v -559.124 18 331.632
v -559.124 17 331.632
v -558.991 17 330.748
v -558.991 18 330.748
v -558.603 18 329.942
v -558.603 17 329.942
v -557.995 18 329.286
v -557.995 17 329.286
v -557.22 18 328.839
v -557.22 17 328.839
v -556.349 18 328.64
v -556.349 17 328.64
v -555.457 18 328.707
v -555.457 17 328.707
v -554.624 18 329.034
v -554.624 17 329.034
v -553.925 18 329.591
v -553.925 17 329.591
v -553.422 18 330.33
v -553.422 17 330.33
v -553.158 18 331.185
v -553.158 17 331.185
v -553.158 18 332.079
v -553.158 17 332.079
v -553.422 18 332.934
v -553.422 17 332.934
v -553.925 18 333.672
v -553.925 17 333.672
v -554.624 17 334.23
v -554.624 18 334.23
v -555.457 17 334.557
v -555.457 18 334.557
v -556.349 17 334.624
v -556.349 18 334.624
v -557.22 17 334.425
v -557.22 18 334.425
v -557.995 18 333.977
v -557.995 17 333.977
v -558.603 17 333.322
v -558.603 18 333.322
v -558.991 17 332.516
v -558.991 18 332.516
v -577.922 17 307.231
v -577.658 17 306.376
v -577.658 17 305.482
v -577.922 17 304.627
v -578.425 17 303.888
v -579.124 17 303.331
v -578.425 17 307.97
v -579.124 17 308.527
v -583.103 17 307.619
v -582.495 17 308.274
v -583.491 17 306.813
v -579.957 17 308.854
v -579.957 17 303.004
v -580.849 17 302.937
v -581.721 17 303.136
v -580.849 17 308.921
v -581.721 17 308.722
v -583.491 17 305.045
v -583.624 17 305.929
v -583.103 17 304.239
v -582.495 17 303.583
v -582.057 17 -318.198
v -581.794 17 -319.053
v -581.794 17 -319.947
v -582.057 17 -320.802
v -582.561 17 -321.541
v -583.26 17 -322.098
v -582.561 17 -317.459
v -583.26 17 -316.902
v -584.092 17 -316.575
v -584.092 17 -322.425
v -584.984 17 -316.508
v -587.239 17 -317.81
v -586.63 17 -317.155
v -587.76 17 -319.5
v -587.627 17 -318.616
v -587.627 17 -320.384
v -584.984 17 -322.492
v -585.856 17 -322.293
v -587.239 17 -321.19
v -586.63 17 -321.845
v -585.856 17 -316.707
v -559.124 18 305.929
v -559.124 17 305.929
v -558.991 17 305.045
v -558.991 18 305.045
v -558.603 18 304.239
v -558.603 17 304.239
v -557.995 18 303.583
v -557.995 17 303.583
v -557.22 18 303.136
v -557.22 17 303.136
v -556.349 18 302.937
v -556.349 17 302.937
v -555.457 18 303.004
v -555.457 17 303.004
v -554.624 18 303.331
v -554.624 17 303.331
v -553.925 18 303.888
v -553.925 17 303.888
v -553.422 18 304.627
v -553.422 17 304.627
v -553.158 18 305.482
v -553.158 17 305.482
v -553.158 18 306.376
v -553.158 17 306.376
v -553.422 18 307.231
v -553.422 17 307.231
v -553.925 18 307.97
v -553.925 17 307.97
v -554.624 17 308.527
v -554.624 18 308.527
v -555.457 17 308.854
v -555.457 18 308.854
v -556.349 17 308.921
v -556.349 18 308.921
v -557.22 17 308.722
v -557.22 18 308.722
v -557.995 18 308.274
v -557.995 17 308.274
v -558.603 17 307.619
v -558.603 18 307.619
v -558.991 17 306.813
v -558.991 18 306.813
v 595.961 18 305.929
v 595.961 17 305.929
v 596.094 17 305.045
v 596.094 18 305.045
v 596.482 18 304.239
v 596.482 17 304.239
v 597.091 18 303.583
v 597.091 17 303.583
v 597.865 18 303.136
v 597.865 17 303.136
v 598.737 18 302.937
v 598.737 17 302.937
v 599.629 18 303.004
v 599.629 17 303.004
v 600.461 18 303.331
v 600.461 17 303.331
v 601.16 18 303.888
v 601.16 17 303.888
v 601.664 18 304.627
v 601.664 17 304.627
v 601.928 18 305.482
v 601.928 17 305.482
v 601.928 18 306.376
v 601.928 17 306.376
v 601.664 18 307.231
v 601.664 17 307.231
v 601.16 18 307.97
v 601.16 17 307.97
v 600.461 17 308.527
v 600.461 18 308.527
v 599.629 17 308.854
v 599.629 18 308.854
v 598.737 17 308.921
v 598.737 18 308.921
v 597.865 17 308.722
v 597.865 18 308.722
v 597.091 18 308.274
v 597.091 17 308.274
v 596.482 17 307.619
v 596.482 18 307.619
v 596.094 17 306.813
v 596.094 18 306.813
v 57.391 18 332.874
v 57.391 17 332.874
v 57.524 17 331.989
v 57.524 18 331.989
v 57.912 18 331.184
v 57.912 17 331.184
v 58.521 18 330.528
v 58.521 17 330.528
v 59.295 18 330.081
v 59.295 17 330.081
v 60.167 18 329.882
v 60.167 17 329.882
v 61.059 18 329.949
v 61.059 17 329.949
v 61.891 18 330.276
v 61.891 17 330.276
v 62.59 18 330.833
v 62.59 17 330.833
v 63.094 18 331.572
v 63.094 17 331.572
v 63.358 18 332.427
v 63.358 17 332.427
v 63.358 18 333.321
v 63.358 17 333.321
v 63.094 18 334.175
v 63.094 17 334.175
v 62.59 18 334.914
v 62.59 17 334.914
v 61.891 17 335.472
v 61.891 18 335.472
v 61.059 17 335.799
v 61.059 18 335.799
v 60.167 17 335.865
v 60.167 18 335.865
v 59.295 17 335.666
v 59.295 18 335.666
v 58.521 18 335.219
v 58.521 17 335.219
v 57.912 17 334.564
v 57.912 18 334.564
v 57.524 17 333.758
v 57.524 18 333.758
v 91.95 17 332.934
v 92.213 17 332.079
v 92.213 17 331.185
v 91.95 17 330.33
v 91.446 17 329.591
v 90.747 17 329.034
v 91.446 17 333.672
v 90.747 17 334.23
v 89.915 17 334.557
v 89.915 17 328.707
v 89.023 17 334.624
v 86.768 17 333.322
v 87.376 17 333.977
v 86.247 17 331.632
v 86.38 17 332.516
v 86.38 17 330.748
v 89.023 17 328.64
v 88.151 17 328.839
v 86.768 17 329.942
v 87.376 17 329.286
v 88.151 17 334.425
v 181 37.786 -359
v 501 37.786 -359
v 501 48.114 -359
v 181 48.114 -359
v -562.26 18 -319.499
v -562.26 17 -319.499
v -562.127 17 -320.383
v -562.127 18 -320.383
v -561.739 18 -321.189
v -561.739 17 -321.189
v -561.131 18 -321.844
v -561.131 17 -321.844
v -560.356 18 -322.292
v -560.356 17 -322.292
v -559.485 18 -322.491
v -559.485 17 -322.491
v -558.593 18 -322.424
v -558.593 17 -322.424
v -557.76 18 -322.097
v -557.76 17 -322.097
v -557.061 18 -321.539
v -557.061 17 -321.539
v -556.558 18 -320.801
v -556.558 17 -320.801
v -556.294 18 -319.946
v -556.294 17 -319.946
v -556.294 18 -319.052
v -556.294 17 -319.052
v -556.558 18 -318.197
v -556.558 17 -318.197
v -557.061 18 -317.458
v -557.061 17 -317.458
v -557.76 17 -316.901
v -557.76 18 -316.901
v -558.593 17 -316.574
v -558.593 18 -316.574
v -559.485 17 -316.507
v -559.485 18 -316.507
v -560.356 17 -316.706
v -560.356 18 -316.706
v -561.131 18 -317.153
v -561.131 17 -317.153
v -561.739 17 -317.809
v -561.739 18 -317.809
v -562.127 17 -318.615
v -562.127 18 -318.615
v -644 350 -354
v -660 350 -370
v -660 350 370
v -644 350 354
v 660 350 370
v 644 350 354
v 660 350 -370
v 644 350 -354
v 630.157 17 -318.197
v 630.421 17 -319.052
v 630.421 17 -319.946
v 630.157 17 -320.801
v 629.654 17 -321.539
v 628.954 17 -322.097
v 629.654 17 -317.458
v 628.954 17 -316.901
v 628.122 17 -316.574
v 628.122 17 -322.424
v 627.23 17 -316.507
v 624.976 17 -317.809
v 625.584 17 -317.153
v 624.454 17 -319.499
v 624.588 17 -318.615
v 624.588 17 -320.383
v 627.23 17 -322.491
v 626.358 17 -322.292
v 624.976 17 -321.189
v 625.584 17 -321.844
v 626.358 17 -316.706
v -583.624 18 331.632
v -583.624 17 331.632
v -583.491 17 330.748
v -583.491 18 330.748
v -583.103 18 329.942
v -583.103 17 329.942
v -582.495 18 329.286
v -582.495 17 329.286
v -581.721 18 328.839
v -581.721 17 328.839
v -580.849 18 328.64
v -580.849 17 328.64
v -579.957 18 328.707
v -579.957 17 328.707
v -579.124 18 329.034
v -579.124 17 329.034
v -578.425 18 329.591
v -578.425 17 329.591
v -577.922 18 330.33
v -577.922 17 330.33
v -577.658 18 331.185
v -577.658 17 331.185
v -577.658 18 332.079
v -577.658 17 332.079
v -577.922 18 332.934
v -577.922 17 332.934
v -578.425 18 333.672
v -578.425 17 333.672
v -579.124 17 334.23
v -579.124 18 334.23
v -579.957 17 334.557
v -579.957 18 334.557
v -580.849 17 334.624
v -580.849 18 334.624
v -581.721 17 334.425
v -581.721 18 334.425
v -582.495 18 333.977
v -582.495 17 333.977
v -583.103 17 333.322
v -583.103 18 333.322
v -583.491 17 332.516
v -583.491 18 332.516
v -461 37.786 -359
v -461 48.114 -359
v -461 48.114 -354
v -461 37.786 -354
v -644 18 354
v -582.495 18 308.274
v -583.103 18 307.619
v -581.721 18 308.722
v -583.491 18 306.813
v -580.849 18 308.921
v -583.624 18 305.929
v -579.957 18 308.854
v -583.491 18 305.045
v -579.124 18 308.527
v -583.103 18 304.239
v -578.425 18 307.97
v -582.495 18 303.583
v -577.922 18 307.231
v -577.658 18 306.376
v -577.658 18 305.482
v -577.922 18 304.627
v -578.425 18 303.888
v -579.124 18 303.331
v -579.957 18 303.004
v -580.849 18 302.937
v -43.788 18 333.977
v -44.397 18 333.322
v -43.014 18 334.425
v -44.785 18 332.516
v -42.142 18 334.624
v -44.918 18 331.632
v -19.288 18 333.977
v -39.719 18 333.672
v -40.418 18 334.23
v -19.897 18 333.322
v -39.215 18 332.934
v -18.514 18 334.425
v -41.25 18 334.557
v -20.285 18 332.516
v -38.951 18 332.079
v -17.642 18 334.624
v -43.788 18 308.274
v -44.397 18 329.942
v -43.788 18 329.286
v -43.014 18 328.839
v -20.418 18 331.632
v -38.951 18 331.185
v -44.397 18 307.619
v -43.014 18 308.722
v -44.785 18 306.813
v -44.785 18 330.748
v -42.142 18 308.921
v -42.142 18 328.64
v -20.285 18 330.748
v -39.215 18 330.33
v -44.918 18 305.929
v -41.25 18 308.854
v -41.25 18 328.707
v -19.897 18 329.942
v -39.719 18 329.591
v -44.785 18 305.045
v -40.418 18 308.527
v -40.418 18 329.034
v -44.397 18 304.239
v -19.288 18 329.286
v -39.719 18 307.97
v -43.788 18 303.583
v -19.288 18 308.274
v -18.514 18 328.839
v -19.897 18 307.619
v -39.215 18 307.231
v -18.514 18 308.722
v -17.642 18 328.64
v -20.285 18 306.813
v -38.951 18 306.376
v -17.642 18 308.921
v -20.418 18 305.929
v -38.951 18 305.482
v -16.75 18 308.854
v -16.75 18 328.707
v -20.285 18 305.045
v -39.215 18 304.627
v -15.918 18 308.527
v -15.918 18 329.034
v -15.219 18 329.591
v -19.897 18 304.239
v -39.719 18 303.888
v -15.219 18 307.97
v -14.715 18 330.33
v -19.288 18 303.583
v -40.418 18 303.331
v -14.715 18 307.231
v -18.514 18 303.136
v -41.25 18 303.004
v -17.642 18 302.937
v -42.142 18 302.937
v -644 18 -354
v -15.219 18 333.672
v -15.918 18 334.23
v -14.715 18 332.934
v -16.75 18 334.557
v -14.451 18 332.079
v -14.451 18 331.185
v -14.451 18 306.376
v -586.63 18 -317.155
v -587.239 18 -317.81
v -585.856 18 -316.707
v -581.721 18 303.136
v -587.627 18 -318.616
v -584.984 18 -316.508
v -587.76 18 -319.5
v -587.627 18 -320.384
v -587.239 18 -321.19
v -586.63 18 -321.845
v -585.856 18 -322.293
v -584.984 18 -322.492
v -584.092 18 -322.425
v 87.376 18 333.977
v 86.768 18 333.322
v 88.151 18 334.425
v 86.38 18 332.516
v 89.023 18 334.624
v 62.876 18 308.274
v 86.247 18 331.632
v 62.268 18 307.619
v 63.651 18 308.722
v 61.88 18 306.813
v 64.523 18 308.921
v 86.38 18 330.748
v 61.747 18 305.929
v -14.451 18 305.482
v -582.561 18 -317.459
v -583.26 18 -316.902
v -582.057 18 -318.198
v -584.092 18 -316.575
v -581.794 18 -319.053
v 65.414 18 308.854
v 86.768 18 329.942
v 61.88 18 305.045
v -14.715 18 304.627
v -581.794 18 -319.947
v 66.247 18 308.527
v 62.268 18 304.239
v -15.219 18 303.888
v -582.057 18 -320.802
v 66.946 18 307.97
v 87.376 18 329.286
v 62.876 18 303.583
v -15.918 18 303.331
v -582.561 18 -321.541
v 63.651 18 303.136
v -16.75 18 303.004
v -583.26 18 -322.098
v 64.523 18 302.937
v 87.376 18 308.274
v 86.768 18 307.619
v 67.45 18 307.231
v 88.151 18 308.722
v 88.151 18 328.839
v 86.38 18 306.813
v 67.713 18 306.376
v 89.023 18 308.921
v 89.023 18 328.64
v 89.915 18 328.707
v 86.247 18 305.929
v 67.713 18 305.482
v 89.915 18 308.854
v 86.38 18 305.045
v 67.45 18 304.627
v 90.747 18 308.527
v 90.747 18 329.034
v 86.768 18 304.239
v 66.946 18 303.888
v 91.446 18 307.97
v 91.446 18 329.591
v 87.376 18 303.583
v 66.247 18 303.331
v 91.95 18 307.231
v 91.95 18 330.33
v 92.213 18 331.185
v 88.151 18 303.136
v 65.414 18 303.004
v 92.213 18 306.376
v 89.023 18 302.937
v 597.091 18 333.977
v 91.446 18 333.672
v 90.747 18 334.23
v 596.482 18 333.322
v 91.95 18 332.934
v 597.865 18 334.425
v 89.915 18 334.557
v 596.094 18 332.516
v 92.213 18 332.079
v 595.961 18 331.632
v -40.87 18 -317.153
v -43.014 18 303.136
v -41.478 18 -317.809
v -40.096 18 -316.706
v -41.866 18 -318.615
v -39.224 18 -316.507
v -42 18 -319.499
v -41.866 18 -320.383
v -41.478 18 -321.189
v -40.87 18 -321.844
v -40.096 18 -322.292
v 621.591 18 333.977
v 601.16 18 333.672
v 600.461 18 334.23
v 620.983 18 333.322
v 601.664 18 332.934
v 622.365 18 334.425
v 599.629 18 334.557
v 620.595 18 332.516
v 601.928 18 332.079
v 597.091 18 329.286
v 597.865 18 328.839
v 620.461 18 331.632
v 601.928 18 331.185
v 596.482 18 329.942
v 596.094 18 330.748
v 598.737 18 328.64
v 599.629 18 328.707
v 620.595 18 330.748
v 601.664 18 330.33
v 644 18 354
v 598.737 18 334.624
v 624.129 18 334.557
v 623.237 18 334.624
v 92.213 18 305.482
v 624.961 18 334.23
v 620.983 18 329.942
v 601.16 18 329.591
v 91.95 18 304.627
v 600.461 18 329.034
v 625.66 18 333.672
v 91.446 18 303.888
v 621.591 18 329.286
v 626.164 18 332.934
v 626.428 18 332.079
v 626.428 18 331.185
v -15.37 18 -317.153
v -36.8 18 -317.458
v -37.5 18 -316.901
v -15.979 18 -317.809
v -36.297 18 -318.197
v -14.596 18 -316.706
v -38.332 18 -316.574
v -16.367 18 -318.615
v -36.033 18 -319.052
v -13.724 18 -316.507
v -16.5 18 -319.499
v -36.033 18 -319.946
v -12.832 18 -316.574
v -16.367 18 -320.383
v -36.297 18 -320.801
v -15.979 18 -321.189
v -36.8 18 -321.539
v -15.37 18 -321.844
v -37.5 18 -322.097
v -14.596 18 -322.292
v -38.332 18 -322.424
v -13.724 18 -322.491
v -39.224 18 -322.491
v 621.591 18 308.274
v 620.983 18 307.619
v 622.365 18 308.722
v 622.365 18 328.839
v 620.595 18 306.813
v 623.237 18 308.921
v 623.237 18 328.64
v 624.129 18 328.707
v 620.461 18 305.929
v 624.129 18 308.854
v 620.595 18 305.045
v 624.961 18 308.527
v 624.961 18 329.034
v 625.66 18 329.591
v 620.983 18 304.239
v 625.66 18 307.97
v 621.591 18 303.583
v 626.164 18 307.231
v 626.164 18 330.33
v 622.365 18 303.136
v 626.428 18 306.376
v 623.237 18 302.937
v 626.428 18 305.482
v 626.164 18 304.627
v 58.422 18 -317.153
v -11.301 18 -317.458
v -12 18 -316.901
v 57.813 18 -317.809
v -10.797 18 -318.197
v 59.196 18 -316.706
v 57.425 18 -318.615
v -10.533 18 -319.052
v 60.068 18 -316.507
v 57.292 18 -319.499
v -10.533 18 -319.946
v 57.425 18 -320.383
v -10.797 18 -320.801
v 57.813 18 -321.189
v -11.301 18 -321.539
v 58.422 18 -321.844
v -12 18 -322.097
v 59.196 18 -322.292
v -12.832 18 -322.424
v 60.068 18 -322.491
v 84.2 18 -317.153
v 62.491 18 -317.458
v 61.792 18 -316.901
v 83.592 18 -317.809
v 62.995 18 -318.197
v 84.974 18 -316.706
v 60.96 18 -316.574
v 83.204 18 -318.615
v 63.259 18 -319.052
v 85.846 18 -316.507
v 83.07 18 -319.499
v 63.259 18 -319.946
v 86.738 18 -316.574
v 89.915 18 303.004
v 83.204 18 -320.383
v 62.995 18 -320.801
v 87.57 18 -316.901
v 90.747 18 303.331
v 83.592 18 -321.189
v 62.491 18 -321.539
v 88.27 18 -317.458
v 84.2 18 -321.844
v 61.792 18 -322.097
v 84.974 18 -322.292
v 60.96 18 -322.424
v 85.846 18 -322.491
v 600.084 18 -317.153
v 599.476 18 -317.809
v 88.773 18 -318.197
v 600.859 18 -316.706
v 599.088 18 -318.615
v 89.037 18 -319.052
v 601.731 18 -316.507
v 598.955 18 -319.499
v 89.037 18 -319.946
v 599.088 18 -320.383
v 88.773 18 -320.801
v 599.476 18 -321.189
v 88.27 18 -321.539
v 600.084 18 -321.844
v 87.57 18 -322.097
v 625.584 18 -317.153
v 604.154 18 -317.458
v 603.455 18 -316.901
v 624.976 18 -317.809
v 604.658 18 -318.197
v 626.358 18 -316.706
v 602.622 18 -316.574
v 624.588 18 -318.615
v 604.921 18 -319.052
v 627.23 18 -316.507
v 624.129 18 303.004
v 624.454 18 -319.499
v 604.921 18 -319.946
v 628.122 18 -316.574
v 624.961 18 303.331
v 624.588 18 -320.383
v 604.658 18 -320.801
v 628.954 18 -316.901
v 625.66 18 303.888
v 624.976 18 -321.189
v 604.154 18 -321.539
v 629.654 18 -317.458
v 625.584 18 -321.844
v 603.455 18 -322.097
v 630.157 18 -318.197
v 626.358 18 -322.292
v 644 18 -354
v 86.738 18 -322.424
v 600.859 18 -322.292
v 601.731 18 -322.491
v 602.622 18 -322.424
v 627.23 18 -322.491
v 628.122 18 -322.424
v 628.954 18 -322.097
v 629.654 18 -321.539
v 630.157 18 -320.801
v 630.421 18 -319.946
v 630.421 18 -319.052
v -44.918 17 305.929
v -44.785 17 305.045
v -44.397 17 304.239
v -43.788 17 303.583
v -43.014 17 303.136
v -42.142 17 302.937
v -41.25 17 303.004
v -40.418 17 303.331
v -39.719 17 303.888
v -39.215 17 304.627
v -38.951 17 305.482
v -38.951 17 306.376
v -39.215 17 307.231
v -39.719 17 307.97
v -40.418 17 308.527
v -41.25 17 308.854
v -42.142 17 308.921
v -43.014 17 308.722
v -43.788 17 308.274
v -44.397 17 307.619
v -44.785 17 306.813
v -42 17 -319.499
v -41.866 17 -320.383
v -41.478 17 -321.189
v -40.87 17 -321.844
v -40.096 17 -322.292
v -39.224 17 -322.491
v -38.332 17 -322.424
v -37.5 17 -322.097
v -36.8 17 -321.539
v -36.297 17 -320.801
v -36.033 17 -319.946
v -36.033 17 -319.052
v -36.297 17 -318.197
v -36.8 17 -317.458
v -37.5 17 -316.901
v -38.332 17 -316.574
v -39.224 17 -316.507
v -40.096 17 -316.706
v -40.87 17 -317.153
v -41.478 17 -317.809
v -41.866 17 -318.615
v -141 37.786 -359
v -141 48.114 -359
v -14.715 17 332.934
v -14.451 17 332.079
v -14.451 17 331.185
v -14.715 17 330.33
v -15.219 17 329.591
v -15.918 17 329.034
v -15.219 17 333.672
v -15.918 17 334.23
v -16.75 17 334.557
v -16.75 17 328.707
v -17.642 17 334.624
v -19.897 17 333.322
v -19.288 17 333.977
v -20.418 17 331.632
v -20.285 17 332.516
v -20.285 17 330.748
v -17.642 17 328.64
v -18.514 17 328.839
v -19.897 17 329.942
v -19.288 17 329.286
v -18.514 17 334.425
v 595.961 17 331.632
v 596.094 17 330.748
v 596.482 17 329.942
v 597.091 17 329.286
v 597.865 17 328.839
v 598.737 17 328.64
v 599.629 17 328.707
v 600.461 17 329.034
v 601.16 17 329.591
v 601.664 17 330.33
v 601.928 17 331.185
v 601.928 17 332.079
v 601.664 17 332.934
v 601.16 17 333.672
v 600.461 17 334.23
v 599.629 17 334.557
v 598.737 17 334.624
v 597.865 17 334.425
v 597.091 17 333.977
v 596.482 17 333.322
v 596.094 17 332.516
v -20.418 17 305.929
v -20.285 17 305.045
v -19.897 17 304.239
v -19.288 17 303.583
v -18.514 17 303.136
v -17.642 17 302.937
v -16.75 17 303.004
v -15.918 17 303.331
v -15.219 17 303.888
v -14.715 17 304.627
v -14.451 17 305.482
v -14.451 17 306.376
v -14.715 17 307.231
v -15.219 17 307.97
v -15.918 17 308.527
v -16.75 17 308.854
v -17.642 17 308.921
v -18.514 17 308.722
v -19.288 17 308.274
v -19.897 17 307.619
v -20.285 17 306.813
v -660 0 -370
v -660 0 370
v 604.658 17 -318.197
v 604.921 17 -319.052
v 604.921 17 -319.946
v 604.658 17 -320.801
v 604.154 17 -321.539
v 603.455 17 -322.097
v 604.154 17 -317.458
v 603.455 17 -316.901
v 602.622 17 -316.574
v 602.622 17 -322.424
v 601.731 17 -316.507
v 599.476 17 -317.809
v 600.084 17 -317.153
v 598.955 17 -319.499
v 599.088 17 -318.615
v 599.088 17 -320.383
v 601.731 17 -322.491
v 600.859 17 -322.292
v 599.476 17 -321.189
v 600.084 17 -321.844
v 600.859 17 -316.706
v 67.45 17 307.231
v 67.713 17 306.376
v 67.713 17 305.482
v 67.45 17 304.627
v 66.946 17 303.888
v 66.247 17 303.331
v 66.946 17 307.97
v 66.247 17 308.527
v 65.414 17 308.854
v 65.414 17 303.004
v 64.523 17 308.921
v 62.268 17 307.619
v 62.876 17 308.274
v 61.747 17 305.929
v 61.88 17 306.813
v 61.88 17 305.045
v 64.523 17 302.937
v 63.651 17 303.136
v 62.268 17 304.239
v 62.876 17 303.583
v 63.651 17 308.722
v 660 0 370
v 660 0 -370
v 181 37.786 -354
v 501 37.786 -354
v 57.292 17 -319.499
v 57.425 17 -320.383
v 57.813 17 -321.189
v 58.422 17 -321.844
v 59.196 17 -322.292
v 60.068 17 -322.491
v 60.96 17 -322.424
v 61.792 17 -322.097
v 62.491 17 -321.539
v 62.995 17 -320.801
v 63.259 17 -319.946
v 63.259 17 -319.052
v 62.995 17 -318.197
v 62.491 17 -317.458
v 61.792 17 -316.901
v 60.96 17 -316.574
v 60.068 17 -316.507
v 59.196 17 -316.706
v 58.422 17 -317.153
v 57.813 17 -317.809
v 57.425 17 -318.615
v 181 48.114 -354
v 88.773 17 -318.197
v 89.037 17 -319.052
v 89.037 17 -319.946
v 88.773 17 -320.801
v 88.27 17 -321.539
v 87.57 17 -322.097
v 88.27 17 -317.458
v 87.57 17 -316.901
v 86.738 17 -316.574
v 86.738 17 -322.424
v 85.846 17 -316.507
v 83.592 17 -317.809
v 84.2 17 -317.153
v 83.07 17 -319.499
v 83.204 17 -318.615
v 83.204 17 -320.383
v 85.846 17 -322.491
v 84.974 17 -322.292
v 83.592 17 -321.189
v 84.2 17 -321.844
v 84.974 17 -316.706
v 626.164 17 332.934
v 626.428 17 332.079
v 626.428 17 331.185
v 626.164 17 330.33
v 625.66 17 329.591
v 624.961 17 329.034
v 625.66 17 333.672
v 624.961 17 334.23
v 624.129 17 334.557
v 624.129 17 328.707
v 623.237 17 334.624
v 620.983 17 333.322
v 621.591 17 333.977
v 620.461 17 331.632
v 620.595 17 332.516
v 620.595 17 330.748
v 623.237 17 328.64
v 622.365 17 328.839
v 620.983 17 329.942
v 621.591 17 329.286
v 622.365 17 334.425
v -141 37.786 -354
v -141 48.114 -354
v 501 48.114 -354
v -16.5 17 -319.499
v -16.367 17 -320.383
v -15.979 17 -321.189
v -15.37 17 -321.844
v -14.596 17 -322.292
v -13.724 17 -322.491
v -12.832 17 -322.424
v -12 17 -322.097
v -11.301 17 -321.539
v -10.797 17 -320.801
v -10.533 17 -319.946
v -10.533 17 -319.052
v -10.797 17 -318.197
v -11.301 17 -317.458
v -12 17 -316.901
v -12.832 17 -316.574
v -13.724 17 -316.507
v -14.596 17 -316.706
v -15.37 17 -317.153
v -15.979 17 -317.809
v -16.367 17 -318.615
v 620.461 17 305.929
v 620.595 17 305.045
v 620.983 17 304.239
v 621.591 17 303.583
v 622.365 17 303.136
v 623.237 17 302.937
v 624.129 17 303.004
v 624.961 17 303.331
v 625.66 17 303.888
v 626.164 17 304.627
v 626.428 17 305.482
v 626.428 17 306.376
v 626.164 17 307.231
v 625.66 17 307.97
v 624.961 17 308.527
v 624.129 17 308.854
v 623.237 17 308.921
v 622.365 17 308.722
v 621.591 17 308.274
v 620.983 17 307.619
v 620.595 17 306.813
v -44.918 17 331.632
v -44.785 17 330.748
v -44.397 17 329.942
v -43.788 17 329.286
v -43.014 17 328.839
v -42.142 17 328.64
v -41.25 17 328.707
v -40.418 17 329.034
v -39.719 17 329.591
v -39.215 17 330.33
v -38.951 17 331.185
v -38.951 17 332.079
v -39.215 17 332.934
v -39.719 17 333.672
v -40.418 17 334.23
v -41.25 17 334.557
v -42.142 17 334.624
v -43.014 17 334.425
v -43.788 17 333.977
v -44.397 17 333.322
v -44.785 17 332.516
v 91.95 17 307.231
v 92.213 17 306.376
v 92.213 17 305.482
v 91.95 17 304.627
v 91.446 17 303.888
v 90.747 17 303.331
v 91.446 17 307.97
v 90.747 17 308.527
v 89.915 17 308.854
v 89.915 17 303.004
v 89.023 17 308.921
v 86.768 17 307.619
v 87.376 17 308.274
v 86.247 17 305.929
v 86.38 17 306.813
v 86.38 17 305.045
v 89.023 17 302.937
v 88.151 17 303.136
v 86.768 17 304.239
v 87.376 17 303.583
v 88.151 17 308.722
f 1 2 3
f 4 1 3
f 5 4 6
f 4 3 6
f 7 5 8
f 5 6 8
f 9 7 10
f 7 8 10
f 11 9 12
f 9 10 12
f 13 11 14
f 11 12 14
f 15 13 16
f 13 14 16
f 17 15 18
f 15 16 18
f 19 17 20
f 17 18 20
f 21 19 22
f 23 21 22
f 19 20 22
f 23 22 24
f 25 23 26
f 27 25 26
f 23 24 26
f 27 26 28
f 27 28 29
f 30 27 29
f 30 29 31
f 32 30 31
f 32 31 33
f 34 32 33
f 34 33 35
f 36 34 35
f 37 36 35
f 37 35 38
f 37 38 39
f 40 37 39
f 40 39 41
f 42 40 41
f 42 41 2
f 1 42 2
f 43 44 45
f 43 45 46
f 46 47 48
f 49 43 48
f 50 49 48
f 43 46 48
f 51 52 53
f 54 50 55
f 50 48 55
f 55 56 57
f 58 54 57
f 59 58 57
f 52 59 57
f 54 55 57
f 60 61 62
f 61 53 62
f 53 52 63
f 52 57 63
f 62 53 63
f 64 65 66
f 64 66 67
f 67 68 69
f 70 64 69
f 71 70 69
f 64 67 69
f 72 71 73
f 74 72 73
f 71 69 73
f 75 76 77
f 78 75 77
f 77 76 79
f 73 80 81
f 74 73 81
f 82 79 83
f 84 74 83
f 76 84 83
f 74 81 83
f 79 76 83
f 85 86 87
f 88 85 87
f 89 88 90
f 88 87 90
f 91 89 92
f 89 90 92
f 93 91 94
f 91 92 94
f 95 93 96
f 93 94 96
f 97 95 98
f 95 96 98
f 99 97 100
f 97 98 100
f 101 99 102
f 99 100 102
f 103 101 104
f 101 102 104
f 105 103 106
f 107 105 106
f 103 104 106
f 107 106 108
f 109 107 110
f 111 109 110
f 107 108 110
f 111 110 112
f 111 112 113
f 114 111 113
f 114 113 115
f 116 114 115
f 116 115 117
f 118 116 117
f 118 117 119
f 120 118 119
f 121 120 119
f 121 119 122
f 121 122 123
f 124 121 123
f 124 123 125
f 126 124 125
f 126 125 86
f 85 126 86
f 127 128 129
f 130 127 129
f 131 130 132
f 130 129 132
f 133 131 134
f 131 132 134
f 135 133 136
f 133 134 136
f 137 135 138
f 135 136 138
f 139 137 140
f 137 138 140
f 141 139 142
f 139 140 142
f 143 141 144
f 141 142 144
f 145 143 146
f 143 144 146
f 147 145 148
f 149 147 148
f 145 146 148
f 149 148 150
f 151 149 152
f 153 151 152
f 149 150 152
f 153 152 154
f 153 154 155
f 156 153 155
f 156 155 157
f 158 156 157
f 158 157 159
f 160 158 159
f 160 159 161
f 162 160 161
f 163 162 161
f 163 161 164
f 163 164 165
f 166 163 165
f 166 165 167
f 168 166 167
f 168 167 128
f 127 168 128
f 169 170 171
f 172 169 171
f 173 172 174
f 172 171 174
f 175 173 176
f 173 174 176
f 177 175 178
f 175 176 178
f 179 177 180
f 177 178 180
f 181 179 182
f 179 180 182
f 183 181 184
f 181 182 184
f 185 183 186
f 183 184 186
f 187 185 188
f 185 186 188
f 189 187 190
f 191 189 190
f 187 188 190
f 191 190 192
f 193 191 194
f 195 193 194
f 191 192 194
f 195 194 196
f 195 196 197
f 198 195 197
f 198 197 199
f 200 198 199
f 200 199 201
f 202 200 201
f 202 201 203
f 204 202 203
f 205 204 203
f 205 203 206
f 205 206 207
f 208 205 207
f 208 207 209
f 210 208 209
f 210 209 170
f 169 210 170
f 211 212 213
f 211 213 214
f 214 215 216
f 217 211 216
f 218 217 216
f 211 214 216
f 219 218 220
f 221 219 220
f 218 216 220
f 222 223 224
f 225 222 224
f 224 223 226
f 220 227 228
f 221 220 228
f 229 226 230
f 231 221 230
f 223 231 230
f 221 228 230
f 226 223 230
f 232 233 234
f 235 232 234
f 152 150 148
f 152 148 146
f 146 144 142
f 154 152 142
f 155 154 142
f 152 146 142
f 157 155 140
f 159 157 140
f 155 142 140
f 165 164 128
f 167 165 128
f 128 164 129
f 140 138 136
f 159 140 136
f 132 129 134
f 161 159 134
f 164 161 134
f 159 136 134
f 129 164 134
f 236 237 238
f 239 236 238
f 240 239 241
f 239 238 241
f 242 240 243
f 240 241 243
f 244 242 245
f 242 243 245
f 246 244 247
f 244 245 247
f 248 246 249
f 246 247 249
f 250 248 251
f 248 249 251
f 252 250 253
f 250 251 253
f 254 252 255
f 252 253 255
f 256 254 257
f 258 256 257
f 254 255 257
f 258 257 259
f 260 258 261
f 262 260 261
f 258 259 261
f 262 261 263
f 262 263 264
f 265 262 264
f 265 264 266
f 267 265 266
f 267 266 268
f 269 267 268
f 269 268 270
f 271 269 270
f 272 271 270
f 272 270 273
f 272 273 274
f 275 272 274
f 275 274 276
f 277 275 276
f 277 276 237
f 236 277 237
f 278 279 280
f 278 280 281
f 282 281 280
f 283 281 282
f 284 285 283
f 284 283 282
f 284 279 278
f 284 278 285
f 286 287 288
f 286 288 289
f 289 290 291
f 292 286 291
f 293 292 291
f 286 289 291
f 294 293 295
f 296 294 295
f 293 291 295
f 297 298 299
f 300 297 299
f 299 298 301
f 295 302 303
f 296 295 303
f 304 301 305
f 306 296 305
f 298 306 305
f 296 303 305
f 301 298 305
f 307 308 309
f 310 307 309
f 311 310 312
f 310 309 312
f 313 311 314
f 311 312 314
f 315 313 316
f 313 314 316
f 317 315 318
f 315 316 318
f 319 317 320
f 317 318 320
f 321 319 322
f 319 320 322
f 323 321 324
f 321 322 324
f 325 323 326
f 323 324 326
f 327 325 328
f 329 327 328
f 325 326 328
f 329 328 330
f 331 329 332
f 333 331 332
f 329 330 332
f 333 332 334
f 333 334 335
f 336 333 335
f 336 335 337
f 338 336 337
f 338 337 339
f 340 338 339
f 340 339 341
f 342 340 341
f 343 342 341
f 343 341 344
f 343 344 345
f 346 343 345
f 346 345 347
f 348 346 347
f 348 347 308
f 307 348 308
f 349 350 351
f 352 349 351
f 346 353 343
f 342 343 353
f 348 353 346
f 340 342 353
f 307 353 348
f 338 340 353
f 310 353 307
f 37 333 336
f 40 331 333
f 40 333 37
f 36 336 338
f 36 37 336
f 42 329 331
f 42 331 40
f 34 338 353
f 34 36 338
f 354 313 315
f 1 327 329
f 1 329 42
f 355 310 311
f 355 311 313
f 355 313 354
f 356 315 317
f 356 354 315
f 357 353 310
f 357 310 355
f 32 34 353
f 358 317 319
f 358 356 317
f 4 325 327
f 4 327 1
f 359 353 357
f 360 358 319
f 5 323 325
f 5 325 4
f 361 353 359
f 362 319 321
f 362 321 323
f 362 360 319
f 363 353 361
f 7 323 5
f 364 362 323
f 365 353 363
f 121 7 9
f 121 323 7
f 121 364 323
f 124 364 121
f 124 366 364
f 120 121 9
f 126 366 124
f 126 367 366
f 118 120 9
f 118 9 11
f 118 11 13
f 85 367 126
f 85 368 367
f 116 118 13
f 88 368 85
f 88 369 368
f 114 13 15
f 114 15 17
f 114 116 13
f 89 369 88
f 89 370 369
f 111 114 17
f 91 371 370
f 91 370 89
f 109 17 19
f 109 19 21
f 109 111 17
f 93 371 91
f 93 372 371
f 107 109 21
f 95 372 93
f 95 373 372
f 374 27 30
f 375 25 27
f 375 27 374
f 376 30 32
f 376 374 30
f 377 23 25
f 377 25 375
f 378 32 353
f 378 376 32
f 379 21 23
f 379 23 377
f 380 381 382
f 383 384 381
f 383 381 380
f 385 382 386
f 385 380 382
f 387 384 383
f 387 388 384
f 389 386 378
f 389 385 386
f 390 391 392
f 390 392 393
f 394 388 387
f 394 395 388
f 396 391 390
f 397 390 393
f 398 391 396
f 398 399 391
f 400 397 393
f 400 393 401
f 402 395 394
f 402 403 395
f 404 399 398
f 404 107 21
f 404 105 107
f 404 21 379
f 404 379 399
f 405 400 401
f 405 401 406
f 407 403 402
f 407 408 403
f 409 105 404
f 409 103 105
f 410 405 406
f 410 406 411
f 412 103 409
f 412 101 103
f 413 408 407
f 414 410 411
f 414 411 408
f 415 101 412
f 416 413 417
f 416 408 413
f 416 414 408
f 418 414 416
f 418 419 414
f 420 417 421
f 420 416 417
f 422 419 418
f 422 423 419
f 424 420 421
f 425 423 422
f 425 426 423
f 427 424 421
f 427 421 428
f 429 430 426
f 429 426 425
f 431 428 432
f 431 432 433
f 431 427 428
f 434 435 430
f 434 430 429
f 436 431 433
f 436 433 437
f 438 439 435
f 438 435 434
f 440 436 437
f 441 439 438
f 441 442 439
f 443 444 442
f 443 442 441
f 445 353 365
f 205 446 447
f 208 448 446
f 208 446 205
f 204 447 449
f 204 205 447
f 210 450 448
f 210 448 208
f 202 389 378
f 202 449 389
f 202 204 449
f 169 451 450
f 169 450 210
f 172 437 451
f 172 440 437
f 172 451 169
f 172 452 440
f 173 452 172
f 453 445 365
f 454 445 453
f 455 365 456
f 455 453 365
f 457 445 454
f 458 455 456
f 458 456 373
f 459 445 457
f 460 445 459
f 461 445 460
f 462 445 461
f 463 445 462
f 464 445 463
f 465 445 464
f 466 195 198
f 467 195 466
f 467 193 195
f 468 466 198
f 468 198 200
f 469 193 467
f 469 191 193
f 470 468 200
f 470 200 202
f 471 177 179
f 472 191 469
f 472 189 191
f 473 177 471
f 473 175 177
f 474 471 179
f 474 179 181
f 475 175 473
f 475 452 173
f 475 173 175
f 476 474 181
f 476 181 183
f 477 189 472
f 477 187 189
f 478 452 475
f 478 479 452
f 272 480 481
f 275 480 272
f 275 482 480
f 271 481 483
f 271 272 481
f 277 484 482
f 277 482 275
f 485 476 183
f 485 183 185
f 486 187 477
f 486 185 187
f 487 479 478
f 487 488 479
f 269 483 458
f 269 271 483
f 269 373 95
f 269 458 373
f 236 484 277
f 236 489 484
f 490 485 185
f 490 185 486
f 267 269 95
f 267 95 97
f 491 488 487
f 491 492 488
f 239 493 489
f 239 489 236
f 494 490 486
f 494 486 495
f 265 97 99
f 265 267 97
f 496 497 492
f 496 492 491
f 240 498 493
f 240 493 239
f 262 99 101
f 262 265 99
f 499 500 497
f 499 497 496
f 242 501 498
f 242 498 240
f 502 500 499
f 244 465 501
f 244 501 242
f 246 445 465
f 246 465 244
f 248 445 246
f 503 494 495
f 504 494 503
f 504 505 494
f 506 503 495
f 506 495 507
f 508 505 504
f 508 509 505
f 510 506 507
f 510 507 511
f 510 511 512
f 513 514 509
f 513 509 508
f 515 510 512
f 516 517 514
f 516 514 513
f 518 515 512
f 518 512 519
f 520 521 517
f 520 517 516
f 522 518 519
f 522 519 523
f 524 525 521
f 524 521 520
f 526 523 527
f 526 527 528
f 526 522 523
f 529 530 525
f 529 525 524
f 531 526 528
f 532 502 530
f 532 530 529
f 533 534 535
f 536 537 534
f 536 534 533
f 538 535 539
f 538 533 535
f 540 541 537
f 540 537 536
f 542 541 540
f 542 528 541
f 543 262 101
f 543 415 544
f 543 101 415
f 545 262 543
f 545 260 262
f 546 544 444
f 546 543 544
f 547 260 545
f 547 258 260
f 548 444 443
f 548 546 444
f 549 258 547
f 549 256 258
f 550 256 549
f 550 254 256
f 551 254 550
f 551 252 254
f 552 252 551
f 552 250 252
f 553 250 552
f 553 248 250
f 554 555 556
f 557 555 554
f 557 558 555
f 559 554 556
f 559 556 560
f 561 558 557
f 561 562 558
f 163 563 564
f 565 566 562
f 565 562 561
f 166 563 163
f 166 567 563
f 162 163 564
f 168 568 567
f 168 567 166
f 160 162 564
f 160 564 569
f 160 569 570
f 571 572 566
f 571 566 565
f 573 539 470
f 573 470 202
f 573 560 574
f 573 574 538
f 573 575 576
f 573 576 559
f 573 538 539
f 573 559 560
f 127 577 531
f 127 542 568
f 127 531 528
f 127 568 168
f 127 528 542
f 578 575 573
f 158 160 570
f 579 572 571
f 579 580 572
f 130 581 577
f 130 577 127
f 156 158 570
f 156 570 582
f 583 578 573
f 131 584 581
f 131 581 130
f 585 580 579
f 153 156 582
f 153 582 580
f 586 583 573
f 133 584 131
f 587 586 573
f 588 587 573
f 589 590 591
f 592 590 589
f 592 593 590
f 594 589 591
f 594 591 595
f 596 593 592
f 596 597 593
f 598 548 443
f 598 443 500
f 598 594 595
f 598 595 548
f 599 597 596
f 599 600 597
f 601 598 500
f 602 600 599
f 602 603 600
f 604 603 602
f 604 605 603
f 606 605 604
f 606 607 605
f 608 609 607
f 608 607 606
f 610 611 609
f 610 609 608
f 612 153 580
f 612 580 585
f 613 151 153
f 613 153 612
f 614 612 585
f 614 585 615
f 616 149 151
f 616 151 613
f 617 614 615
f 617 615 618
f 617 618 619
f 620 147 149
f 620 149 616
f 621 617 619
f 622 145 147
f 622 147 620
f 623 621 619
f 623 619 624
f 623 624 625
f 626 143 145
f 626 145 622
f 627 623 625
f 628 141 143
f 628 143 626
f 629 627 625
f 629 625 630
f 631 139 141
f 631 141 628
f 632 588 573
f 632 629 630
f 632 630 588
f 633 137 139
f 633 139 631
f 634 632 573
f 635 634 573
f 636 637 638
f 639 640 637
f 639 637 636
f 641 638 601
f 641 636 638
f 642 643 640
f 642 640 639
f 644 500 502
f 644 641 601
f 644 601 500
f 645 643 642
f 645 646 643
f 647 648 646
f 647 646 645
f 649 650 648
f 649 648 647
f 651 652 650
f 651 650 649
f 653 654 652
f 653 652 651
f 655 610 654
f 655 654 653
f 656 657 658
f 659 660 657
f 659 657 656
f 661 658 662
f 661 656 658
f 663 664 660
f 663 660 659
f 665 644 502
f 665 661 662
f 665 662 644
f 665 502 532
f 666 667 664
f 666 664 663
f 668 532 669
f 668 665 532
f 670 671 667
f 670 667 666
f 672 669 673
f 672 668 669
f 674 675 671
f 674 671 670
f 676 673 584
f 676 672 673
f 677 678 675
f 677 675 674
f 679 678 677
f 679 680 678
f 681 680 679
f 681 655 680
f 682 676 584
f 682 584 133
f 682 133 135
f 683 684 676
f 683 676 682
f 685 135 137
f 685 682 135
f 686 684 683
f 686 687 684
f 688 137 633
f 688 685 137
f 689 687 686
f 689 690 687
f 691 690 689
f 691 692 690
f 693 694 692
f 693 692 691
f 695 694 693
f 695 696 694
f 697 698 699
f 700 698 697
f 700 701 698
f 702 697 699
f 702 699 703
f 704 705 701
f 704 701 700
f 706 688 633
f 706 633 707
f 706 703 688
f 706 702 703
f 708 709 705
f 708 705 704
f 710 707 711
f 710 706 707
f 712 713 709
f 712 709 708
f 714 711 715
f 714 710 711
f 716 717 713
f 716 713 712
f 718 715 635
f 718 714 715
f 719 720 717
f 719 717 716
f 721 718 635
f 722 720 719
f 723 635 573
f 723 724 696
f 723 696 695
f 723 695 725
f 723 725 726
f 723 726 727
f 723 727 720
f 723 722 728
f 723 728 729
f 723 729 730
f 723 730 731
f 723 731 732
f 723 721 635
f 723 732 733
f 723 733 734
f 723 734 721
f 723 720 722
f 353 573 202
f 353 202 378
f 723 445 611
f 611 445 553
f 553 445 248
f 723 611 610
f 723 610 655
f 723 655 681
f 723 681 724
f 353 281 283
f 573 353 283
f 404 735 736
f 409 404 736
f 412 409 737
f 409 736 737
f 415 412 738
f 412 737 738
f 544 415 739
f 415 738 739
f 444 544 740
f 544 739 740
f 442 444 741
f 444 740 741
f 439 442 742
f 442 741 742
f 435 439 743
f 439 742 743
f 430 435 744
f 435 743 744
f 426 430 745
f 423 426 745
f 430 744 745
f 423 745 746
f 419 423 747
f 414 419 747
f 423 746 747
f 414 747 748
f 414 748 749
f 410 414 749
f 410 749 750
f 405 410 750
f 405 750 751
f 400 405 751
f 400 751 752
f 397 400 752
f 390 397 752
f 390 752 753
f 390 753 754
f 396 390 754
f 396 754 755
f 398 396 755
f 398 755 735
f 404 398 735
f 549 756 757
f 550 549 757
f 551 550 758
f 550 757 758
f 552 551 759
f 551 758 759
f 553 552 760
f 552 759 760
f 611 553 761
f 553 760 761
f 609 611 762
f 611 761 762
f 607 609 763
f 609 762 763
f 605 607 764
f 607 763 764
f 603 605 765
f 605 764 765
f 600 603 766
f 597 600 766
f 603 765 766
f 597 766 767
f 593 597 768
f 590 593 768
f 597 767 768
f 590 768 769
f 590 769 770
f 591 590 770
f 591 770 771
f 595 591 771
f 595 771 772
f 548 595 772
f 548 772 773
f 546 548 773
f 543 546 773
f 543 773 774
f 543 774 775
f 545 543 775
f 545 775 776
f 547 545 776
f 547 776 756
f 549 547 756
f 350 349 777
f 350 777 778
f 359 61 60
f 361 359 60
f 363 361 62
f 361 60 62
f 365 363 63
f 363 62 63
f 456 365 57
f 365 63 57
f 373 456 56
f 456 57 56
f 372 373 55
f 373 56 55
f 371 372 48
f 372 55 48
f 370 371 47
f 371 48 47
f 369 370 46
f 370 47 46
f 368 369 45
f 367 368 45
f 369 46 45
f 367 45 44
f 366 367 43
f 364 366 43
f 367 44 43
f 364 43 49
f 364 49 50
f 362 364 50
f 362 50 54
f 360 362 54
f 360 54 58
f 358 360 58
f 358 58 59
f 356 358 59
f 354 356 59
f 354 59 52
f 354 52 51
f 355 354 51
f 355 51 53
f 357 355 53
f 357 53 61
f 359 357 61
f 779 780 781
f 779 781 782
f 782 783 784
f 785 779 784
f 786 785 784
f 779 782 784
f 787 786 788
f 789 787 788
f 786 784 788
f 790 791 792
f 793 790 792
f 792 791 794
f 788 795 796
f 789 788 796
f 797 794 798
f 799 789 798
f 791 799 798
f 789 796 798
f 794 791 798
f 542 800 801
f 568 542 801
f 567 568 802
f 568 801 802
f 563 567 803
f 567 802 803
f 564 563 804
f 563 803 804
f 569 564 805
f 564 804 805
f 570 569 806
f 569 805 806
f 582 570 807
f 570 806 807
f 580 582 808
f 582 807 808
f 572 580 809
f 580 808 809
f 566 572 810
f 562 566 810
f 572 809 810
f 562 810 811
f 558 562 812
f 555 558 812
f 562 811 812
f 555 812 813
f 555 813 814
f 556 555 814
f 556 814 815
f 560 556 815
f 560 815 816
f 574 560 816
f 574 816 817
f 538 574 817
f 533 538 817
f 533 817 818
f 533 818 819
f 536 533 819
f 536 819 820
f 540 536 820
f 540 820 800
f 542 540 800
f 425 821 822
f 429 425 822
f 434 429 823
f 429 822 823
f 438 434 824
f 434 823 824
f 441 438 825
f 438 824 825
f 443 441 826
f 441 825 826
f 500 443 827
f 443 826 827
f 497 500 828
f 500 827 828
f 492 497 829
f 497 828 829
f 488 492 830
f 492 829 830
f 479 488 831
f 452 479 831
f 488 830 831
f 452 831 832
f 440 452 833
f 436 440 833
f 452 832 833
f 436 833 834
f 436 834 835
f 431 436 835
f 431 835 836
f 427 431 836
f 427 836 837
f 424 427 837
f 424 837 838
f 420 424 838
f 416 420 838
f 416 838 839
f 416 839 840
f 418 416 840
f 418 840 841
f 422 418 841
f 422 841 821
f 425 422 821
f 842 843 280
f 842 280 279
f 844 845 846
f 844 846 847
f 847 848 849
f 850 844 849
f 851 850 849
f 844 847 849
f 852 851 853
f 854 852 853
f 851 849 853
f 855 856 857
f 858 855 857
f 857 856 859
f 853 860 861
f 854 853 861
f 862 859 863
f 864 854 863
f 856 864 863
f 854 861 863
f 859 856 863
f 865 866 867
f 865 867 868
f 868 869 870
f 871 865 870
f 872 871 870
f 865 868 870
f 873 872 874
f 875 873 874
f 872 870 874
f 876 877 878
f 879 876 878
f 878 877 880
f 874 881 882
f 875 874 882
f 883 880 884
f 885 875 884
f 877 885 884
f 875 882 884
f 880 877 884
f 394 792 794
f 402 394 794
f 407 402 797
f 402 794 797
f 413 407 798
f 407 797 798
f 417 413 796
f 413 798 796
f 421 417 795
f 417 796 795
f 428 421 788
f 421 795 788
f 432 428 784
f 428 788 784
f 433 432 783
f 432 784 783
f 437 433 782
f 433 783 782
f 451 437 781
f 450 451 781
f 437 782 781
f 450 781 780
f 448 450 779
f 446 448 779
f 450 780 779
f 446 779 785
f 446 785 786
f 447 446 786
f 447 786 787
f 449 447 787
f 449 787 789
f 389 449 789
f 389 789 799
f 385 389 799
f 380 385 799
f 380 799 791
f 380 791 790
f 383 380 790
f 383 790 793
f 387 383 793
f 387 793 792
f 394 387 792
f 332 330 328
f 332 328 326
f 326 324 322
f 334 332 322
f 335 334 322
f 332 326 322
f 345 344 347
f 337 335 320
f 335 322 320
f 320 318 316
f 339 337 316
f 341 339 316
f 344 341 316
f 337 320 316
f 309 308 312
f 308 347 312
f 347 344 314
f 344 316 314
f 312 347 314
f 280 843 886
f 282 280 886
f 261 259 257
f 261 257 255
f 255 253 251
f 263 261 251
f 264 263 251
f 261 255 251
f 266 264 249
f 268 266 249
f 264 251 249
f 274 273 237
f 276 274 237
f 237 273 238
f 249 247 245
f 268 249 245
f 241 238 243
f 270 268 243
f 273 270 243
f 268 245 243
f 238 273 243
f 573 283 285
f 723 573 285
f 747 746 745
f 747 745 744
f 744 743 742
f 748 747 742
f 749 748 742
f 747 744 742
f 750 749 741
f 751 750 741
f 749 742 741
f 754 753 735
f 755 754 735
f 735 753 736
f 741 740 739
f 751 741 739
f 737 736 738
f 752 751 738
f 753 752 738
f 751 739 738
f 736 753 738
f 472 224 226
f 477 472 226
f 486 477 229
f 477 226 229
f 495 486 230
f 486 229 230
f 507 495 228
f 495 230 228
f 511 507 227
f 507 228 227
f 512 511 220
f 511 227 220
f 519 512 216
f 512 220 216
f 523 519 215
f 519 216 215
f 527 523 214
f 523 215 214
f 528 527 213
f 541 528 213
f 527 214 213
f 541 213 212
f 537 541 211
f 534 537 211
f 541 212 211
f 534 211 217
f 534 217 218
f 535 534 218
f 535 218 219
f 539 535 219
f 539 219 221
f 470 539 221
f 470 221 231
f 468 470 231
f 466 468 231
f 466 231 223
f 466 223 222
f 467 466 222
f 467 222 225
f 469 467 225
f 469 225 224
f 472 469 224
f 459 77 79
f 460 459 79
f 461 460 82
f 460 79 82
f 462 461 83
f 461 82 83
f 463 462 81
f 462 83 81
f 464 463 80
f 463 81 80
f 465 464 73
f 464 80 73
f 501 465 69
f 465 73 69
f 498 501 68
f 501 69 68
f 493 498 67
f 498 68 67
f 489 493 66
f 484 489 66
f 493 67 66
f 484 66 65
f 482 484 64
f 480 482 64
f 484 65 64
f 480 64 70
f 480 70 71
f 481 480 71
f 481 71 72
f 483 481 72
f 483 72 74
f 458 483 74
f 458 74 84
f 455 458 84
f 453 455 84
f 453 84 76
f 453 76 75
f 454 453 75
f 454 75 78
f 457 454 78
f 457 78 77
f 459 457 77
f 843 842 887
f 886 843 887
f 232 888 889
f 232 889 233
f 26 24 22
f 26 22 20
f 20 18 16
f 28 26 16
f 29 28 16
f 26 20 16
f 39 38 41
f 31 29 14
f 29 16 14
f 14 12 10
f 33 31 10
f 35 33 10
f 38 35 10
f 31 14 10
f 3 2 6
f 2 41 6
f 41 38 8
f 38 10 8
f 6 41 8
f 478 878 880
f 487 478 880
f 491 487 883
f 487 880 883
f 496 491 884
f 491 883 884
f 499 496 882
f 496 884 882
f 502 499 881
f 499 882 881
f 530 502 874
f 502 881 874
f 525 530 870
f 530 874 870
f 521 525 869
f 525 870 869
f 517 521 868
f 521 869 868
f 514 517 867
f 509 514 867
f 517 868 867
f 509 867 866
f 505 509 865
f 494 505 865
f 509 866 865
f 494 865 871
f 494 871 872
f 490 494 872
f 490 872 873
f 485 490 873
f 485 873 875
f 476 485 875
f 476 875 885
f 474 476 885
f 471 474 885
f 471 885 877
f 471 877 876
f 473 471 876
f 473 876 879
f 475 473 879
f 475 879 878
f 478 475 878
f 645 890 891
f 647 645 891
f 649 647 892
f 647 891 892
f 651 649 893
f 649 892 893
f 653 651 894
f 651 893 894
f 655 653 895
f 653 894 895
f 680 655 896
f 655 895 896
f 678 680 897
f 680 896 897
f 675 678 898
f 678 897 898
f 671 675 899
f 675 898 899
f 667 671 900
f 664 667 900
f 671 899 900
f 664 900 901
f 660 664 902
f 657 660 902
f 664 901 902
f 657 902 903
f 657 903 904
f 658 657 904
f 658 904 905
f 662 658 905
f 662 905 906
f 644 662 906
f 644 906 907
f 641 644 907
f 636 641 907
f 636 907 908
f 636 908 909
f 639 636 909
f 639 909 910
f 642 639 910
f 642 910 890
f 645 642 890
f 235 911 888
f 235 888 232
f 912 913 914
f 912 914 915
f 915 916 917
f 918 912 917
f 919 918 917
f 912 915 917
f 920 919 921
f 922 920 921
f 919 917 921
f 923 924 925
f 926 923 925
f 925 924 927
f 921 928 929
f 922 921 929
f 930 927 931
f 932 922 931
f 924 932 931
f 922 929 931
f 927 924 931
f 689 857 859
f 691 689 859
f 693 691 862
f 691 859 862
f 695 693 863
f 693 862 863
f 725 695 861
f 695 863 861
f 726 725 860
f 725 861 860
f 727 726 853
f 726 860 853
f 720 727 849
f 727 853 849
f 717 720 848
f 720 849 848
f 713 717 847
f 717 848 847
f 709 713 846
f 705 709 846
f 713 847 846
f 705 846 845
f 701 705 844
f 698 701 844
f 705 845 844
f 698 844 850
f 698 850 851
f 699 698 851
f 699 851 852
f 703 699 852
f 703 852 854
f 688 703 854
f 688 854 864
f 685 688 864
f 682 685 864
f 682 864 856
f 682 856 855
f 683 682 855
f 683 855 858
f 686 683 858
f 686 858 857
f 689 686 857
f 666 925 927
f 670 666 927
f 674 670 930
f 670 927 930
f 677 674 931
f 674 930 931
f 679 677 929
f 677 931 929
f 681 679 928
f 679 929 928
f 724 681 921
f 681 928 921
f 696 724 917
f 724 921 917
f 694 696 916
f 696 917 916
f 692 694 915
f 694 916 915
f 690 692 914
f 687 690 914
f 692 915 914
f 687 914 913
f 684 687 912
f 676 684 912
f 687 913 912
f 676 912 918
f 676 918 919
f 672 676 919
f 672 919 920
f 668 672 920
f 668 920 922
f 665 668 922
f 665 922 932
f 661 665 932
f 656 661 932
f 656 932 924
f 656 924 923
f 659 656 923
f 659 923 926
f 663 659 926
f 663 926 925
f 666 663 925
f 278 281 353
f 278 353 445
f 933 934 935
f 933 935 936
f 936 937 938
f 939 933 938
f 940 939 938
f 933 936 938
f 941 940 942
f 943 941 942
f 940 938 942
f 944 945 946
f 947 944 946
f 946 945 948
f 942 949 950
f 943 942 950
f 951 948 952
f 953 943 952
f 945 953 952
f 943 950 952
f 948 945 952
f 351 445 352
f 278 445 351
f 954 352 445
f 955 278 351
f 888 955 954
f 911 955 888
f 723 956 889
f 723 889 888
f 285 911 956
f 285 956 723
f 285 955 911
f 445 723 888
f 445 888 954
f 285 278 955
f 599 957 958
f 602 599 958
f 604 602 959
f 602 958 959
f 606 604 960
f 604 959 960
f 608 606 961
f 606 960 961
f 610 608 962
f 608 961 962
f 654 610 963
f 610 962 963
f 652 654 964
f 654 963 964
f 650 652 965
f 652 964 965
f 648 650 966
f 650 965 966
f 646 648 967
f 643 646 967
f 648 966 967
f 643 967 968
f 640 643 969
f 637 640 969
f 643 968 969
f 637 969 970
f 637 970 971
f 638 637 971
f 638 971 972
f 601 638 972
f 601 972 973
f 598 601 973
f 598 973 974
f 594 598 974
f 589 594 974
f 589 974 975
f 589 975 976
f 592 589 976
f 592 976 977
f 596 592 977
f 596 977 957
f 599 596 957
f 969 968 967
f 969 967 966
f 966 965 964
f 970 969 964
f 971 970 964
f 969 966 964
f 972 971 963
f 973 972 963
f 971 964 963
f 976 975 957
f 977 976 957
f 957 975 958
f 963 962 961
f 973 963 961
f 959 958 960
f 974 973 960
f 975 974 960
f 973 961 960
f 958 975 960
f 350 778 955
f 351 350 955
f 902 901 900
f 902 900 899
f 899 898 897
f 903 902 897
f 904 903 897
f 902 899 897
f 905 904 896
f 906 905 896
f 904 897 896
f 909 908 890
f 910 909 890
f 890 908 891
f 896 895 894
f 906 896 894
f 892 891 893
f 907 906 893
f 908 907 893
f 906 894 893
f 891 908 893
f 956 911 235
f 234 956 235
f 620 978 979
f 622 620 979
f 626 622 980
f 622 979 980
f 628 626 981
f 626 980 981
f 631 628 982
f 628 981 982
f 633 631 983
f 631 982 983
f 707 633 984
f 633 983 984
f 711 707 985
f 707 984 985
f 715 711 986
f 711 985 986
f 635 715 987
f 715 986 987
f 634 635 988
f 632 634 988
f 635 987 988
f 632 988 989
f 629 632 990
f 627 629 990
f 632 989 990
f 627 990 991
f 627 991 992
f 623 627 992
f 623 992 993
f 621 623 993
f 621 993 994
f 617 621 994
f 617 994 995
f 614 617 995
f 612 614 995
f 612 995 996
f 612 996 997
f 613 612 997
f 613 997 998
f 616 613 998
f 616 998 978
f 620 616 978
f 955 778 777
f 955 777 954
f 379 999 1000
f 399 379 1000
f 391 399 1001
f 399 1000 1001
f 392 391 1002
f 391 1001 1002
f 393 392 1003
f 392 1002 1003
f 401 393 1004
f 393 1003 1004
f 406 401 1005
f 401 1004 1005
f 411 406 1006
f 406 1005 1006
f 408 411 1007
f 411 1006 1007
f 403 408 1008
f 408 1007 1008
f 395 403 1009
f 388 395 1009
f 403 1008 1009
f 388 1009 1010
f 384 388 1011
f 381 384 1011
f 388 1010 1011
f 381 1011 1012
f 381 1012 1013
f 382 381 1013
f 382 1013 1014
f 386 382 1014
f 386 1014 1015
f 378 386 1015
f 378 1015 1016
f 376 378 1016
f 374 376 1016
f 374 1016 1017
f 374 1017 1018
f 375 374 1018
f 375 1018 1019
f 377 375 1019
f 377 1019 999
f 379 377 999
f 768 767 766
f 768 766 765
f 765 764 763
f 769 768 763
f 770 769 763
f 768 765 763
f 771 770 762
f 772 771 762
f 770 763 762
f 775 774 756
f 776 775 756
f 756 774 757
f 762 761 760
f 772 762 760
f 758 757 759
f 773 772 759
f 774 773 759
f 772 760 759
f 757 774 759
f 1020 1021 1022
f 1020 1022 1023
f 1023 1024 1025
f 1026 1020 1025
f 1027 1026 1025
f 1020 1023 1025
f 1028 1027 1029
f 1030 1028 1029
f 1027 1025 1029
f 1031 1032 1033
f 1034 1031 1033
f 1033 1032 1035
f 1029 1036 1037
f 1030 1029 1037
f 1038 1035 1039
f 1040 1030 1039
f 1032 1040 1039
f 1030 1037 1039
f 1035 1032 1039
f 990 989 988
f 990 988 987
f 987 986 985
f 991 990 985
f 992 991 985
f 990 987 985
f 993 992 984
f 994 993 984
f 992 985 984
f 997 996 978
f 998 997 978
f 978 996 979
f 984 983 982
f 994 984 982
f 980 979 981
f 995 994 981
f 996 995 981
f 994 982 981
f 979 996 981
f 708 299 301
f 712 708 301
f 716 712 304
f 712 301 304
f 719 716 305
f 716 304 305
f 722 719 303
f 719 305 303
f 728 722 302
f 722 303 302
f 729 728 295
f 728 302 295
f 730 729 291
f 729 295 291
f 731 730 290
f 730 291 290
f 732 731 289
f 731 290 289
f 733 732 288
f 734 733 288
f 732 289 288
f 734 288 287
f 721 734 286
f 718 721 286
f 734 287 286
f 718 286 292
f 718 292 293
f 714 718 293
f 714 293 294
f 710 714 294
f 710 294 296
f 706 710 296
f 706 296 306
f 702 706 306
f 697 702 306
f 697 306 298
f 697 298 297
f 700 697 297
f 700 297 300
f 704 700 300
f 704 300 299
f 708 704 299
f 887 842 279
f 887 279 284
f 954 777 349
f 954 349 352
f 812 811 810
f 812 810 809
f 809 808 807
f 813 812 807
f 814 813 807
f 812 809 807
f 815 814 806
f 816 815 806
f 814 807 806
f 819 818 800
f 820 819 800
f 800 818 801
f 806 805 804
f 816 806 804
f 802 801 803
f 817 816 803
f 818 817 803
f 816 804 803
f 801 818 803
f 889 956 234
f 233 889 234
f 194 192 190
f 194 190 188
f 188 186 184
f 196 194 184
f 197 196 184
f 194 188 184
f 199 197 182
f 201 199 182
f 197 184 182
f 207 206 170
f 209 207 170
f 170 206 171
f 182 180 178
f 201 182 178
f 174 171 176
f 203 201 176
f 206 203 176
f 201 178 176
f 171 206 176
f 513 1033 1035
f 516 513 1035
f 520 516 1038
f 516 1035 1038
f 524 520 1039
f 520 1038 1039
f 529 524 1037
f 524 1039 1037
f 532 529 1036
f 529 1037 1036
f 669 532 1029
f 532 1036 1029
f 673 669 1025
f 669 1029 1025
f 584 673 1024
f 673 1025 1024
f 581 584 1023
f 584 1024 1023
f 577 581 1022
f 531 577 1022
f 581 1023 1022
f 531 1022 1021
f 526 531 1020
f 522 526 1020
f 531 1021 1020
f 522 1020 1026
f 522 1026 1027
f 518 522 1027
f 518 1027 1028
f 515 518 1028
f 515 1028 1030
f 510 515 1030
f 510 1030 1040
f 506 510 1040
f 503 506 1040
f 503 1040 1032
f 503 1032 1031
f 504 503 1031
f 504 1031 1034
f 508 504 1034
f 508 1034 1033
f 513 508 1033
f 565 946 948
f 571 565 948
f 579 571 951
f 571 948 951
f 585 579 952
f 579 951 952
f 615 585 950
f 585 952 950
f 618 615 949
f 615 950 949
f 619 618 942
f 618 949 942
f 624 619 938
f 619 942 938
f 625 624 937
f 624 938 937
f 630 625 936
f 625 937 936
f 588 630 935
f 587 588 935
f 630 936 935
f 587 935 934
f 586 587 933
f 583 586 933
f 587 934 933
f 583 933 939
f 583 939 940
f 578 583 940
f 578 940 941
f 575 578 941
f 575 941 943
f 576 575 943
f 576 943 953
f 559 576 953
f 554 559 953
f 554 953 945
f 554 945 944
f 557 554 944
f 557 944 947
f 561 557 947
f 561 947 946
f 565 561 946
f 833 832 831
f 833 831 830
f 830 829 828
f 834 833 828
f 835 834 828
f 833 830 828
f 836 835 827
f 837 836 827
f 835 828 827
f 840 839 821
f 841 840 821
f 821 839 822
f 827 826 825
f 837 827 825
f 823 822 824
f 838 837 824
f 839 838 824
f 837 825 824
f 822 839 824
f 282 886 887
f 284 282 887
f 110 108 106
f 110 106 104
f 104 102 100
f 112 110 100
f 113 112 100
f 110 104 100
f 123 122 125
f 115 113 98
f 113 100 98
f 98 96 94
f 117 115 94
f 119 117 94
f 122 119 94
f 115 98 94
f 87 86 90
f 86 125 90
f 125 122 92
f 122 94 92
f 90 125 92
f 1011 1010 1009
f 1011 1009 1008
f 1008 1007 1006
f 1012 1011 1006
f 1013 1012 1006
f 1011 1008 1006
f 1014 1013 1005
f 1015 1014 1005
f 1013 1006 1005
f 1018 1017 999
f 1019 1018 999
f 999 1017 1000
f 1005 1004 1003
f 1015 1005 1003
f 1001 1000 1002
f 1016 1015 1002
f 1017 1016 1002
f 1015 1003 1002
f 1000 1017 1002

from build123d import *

# Parameters (mm, degrees)
CROQUIS1_W                       = 1320
CROQUIS1_H                       = 740
SALIENTE_EXTRUIR1_DEPTH          = 350
CROQUIS2_W                       = 1288
CROQUIS2_H                       = 708
CORTAR_EXTRUIR1_DEPTH            = 332
TALADRO_DE_MARGEN_PARA_M61_D     = 6
TALADRO_DE_MARGEN_PARA_M61_DEPTH = 1
TALADRO_DE_MARGEN_PARA_M62_D     = 6
TALADRO_DE_MARGEN_PARA_M62_DEPTH = 1
CORTAR_EXTRUIR2_START            = -143
CROQUIS7_W                       = 5
CROQUIS7_H                       = 10.328249786
CORTAR_EXTRUIR2_DEPTH            = 320
CORTAR_EXTRUIR3_START            = -183
CROQUIS8_W                       = 5
CROQUIS8_H                       = 10.328249786
CORTAR_EXTRUIR3_DEPTH            = 320


with BuildPart() as part:
    # Croquis1 → Saliente-Extruir1 (new body)
    with BuildSketch(Plane(origin=(0, 0, 0), x_dir=(1, 0, 0), z_dir=(0, 1, 0))):
        Rectangle(CROQUIS1_W, CROQUIS1_H)
    extrude(amount=SALIENTE_EXTRUIR1_DEPTH)

    # Croquis2 → Cortar-Extruir1 (cut)
    with BuildSketch(Plane(origin=(0, 350, 0), x_dir=(1, 0, 0), z_dir=(0, 1, 0))):
        Rectangle(CROQUIS2_W, CROQUIS2_H)
    extrude(amount=-CORTAR_EXTRUIR1_DEPTH, mode=Mode.SUBTRACT)

    # Taladro de margen para M61
    with Locations(Plane(origin=(275.040116616, 18, -214.423302292), x_dir=(1, 0, 0), z_dir=(0, 1, 0))):
        with Locations((-831.164543187, -520.352285028), (-831.164543187, -546.055205699), (-855.664607514, -546.055205699), (-855.664607514, -520.352285028)):
            Hole(TALADRO_DE_MARGEN_PARA_M61_D / 2, depth=TALADRO_DE_MARGEN_PARA_M61_DEPTH)

    # Taladro de margen para M62
    with Locations(Plane(origin=(275.040116616, 18, -214.423302292), x_dir=(1, 0, 0), z_dir=(0, 1, 0))):
        with Locations((-859.800116616, 105.076697708), (-834.300547142, 105.075612323), (-314.039673698, 105.075612323), (-288.540104225, 105.075612323), (-214.748048522, 105.075612323), (-188.969749284, 105.075612323), (326.914692955, 105.075612323), (352.414262429, 105.075612323), (323.921080143, -520.352285028), (348.42114447, -520.352285028), (348.42114447, -546.055205699), (323.921080143, -546.055205699), (-185.793163735, -520.352285028), (-185.793163735, -546.055205699), (-214.649068849, -547.297061638), (-210.293228062, -520.352285028), (-292.457959943, -520.352285028), (-292.457959943, -546.055205699), (-316.95802427, -546.055205699), (-316.95802427, -520.352285028)):
            Hole(TALADRO_DE_MARGEN_PARA_M62_D / 2, depth=TALADRO_DE_MARGEN_PARA_M62_DEPTH)

    # Croquis7 → Cortar-Extruir2 (cut)
    with BuildSketch(Plane(origin=(644, 0, -214.423302292), x_dir=(0, 0, -1), z_dir=(1, 0, 0)).offset(CORTAR_EXTRUIR2_START)):
        with Locations((142.076697708, 42.95033831)):
            Rectangle(CROQUIS7_W, CROQUIS7_H)
    extrude(amount=-CORTAR_EXTRUIR2_DEPTH, mode=Mode.SUBTRACT)

    # Croquis8 → Cortar-Extruir3 (cut)
    with BuildSketch(Plane(origin=(-644, 0, -214.423302292), x_dir=(0, 0, 1), z_dir=(-1, 0, 0)).offset(CORTAR_EXTRUIR3_START)):
        with Locations((-142.076697708, 42.95033831)):
            Rectangle(CROQUIS8_W, CROQUIS8_H)
    extrude(amount=-CORTAR_EXTRUIR3_DEPTH, mode=Mode.SUBTRACT)


solid = part.part
